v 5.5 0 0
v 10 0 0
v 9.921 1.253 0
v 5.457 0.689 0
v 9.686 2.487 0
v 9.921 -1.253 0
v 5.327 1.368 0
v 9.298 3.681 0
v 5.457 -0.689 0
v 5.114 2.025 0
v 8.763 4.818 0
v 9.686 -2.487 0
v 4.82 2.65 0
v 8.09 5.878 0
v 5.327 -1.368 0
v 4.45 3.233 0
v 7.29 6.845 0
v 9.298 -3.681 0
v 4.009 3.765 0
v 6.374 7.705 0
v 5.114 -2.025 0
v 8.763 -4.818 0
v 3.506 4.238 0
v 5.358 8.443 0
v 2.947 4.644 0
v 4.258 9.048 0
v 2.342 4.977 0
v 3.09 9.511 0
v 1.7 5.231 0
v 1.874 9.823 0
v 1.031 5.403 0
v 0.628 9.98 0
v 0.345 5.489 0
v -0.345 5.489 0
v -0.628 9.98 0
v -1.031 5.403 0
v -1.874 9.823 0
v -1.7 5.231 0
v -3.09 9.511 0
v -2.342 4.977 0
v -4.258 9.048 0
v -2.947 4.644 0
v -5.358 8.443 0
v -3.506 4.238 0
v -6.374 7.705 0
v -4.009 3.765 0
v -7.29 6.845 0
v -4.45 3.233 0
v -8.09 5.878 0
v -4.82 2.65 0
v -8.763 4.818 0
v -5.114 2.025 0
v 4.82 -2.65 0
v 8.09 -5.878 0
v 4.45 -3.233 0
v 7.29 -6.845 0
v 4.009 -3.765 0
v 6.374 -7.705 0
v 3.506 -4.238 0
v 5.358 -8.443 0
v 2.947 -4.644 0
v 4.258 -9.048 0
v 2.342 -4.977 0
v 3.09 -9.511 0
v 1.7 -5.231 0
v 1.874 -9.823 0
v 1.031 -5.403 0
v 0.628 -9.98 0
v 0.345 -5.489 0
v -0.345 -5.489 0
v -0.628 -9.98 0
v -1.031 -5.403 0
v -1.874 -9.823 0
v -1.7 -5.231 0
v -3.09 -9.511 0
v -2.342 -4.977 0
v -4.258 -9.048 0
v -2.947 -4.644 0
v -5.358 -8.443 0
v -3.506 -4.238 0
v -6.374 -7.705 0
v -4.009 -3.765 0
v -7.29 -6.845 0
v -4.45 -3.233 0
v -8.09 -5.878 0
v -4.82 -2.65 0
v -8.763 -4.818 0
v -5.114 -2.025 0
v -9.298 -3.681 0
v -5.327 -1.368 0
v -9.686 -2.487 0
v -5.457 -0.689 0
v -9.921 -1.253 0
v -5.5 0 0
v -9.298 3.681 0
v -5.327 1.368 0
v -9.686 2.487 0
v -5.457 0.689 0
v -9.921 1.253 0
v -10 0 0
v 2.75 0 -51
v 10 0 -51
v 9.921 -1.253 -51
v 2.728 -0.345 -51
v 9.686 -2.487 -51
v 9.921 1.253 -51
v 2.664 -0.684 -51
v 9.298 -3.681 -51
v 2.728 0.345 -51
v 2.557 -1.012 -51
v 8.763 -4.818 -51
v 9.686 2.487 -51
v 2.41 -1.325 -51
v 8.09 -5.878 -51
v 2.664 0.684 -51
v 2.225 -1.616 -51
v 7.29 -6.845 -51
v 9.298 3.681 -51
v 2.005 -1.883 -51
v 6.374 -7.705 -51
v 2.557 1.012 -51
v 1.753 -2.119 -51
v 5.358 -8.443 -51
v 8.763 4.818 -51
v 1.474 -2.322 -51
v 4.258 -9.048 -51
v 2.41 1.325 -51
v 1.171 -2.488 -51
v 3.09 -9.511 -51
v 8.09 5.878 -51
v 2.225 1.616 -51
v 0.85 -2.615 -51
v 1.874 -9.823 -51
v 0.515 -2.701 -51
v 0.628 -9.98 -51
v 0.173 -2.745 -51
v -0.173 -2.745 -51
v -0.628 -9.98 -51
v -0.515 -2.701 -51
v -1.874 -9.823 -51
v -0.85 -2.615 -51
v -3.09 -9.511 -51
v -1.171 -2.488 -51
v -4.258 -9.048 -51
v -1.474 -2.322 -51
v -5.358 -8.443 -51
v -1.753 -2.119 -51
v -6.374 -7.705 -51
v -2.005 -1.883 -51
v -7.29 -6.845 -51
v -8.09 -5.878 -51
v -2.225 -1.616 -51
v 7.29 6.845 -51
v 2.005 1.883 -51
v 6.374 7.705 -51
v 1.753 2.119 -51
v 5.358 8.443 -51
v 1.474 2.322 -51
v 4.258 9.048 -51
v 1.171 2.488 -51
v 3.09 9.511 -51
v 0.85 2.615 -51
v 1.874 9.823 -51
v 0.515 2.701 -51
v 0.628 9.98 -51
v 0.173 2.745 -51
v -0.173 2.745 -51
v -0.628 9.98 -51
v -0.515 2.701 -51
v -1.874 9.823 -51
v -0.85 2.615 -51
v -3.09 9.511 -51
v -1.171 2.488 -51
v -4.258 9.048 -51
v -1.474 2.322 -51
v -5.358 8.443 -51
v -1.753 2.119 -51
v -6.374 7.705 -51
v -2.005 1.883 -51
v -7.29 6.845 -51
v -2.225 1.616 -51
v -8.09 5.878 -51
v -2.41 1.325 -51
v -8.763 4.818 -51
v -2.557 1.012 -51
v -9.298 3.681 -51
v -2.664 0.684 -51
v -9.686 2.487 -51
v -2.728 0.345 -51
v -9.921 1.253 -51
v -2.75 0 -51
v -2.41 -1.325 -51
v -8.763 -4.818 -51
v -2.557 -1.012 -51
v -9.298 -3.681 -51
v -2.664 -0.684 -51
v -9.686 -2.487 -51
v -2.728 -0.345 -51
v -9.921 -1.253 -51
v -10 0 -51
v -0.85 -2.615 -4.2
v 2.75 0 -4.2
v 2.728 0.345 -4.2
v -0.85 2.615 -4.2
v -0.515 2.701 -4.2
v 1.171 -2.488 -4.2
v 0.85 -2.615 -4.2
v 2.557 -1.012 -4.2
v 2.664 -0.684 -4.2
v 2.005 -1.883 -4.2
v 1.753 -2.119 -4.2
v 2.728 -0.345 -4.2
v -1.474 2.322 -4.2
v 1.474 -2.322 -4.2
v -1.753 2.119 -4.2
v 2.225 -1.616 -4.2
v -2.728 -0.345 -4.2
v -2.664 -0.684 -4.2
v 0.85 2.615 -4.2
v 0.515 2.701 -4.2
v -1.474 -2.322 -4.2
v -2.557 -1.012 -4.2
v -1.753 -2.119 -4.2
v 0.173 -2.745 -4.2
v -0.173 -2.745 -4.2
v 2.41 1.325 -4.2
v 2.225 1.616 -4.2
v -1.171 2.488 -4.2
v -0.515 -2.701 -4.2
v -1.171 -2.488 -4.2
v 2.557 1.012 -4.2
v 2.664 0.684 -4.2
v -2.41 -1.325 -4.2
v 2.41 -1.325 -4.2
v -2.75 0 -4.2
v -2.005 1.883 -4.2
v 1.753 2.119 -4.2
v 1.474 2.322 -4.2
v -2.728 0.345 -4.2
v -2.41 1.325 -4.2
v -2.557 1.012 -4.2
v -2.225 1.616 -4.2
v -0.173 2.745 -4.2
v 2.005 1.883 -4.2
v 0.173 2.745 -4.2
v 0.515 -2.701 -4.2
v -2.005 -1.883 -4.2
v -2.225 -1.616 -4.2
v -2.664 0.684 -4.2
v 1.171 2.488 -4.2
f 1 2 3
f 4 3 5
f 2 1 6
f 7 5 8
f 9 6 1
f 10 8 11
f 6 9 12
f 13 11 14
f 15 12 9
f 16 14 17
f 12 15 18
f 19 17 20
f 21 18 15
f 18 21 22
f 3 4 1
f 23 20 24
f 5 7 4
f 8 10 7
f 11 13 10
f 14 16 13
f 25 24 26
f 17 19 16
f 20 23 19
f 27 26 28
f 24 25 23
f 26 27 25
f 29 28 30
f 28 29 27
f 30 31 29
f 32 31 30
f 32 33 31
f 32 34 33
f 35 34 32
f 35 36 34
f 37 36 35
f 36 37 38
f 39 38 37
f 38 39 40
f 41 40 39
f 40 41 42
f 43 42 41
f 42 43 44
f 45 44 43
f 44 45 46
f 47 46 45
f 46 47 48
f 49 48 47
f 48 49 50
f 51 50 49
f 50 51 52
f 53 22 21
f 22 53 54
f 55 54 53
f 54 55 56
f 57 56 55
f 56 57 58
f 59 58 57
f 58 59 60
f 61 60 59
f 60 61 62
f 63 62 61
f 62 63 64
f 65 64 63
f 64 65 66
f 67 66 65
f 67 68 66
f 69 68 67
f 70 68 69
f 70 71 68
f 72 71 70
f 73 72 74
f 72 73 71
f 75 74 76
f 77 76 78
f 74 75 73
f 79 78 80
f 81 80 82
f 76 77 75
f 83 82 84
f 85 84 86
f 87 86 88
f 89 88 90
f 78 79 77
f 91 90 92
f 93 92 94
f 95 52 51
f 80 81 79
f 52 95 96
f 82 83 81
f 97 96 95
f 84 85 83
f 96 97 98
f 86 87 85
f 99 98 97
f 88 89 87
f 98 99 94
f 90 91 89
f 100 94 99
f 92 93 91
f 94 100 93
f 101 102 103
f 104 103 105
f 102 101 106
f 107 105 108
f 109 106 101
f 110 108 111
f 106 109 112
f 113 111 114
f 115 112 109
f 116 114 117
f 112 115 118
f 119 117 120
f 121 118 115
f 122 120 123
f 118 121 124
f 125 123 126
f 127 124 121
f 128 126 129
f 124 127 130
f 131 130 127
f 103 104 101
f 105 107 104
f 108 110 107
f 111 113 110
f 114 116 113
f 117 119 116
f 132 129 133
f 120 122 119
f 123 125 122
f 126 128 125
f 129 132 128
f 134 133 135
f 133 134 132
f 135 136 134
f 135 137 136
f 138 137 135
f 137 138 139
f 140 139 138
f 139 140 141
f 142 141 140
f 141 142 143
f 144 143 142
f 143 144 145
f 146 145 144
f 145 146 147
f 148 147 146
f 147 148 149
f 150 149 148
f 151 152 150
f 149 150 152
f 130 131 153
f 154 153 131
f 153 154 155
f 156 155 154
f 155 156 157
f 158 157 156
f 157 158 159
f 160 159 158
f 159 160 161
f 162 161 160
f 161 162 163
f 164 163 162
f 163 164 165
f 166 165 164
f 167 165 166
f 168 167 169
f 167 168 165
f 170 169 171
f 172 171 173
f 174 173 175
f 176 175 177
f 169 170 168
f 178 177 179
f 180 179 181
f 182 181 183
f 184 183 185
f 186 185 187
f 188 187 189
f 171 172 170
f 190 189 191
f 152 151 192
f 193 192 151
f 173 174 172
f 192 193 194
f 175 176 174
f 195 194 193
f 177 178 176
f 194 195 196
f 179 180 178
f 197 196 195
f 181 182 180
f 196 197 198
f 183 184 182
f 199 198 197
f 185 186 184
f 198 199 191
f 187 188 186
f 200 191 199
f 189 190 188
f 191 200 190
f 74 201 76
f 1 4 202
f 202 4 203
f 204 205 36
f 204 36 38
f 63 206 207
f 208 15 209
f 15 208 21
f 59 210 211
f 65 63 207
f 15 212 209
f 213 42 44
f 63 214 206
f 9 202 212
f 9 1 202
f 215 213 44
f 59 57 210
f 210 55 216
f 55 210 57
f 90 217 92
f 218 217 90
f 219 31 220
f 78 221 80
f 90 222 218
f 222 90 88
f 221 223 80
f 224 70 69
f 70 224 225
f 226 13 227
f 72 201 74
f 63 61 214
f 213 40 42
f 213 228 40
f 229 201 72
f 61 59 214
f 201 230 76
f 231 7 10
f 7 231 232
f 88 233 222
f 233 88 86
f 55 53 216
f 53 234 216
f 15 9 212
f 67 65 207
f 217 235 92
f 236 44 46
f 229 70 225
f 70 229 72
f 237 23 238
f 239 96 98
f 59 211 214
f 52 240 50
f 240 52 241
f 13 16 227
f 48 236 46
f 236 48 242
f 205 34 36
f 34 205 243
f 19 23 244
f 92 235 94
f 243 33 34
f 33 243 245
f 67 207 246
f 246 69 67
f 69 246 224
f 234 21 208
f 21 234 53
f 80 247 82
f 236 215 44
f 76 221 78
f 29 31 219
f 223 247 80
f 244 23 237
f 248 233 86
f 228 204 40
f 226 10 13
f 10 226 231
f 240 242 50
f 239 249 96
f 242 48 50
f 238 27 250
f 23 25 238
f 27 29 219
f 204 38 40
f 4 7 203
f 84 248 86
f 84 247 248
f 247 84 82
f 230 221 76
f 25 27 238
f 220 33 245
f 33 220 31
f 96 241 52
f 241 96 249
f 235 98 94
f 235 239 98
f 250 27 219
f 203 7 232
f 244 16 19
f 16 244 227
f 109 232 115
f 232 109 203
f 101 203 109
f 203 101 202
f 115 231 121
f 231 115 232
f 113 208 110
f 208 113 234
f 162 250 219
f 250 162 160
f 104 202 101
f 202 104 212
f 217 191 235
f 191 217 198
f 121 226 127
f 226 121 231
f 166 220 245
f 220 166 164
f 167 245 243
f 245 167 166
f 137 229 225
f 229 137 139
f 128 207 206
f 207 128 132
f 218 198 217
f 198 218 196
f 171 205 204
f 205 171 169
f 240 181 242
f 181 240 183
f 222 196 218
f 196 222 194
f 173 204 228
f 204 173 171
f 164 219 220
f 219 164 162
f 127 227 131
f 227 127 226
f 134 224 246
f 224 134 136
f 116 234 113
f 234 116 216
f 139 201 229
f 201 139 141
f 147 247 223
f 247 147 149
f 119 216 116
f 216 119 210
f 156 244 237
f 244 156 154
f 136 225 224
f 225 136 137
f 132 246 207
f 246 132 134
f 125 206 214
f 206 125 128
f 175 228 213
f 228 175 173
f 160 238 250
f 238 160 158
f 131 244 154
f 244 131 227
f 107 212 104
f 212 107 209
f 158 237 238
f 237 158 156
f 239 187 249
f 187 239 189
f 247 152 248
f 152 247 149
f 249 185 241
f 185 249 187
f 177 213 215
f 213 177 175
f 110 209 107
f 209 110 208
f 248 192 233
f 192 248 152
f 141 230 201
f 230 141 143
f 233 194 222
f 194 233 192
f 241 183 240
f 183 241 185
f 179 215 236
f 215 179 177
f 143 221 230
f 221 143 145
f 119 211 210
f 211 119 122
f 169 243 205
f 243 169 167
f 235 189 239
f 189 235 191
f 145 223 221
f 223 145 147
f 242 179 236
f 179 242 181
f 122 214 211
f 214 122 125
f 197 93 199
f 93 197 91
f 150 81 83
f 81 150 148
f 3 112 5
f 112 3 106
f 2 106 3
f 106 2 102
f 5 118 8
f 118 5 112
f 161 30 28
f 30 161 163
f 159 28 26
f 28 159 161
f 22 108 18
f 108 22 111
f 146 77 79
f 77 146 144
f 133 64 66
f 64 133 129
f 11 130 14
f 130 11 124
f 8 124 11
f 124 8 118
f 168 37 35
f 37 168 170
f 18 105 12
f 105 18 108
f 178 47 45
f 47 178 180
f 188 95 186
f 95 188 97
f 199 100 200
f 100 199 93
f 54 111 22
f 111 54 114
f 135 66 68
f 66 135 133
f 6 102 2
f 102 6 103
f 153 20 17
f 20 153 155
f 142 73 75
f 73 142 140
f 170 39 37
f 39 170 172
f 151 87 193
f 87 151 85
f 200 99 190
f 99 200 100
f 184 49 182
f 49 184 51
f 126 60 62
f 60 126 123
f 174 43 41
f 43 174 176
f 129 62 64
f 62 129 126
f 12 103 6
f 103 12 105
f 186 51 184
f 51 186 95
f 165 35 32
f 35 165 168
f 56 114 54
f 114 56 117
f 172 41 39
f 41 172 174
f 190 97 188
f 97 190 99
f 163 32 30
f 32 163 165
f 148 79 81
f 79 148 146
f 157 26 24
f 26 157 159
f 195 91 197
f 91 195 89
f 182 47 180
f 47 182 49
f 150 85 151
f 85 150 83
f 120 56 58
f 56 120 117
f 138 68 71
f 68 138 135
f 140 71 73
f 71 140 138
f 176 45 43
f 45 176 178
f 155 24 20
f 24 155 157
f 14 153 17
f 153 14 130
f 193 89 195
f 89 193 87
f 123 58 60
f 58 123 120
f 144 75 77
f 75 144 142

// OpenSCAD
$fn = 50;


difference() {
	union() {
		translate(v = [0, 0, -51.0000000000]) {
			cylinder(h = 51, r = 10.0000000000);
		}
		cylinder(h = 0, r = 19.0000000000);
	}
	union() {
		translate(v = [0, 0, 0]) {
			rotate(a = [0, 0, 0]) {
				difference() {
					union() {
						#translate(v = [0, 0, -51.0000000000]) {
							cylinder(h = 51, r = 2.2500000000);
						}
						#translate(v = [0, 0, -4.2000000000]) {
							cylinder(h = 4.2000000000, r1 = 2.7500000000, r2 = 5.5000000000);
						}
						#translate(v = [0, 0, -51.0000000000]) {
							cylinder(h = 51, r = 2.7500000000);
						}
						#translate(v = [0, 0, -51.0000000000]) {
							cylinder(h = 51, r = 2.2500000000);
						}
					}
					union();
				}
			}
		}
	}
}
